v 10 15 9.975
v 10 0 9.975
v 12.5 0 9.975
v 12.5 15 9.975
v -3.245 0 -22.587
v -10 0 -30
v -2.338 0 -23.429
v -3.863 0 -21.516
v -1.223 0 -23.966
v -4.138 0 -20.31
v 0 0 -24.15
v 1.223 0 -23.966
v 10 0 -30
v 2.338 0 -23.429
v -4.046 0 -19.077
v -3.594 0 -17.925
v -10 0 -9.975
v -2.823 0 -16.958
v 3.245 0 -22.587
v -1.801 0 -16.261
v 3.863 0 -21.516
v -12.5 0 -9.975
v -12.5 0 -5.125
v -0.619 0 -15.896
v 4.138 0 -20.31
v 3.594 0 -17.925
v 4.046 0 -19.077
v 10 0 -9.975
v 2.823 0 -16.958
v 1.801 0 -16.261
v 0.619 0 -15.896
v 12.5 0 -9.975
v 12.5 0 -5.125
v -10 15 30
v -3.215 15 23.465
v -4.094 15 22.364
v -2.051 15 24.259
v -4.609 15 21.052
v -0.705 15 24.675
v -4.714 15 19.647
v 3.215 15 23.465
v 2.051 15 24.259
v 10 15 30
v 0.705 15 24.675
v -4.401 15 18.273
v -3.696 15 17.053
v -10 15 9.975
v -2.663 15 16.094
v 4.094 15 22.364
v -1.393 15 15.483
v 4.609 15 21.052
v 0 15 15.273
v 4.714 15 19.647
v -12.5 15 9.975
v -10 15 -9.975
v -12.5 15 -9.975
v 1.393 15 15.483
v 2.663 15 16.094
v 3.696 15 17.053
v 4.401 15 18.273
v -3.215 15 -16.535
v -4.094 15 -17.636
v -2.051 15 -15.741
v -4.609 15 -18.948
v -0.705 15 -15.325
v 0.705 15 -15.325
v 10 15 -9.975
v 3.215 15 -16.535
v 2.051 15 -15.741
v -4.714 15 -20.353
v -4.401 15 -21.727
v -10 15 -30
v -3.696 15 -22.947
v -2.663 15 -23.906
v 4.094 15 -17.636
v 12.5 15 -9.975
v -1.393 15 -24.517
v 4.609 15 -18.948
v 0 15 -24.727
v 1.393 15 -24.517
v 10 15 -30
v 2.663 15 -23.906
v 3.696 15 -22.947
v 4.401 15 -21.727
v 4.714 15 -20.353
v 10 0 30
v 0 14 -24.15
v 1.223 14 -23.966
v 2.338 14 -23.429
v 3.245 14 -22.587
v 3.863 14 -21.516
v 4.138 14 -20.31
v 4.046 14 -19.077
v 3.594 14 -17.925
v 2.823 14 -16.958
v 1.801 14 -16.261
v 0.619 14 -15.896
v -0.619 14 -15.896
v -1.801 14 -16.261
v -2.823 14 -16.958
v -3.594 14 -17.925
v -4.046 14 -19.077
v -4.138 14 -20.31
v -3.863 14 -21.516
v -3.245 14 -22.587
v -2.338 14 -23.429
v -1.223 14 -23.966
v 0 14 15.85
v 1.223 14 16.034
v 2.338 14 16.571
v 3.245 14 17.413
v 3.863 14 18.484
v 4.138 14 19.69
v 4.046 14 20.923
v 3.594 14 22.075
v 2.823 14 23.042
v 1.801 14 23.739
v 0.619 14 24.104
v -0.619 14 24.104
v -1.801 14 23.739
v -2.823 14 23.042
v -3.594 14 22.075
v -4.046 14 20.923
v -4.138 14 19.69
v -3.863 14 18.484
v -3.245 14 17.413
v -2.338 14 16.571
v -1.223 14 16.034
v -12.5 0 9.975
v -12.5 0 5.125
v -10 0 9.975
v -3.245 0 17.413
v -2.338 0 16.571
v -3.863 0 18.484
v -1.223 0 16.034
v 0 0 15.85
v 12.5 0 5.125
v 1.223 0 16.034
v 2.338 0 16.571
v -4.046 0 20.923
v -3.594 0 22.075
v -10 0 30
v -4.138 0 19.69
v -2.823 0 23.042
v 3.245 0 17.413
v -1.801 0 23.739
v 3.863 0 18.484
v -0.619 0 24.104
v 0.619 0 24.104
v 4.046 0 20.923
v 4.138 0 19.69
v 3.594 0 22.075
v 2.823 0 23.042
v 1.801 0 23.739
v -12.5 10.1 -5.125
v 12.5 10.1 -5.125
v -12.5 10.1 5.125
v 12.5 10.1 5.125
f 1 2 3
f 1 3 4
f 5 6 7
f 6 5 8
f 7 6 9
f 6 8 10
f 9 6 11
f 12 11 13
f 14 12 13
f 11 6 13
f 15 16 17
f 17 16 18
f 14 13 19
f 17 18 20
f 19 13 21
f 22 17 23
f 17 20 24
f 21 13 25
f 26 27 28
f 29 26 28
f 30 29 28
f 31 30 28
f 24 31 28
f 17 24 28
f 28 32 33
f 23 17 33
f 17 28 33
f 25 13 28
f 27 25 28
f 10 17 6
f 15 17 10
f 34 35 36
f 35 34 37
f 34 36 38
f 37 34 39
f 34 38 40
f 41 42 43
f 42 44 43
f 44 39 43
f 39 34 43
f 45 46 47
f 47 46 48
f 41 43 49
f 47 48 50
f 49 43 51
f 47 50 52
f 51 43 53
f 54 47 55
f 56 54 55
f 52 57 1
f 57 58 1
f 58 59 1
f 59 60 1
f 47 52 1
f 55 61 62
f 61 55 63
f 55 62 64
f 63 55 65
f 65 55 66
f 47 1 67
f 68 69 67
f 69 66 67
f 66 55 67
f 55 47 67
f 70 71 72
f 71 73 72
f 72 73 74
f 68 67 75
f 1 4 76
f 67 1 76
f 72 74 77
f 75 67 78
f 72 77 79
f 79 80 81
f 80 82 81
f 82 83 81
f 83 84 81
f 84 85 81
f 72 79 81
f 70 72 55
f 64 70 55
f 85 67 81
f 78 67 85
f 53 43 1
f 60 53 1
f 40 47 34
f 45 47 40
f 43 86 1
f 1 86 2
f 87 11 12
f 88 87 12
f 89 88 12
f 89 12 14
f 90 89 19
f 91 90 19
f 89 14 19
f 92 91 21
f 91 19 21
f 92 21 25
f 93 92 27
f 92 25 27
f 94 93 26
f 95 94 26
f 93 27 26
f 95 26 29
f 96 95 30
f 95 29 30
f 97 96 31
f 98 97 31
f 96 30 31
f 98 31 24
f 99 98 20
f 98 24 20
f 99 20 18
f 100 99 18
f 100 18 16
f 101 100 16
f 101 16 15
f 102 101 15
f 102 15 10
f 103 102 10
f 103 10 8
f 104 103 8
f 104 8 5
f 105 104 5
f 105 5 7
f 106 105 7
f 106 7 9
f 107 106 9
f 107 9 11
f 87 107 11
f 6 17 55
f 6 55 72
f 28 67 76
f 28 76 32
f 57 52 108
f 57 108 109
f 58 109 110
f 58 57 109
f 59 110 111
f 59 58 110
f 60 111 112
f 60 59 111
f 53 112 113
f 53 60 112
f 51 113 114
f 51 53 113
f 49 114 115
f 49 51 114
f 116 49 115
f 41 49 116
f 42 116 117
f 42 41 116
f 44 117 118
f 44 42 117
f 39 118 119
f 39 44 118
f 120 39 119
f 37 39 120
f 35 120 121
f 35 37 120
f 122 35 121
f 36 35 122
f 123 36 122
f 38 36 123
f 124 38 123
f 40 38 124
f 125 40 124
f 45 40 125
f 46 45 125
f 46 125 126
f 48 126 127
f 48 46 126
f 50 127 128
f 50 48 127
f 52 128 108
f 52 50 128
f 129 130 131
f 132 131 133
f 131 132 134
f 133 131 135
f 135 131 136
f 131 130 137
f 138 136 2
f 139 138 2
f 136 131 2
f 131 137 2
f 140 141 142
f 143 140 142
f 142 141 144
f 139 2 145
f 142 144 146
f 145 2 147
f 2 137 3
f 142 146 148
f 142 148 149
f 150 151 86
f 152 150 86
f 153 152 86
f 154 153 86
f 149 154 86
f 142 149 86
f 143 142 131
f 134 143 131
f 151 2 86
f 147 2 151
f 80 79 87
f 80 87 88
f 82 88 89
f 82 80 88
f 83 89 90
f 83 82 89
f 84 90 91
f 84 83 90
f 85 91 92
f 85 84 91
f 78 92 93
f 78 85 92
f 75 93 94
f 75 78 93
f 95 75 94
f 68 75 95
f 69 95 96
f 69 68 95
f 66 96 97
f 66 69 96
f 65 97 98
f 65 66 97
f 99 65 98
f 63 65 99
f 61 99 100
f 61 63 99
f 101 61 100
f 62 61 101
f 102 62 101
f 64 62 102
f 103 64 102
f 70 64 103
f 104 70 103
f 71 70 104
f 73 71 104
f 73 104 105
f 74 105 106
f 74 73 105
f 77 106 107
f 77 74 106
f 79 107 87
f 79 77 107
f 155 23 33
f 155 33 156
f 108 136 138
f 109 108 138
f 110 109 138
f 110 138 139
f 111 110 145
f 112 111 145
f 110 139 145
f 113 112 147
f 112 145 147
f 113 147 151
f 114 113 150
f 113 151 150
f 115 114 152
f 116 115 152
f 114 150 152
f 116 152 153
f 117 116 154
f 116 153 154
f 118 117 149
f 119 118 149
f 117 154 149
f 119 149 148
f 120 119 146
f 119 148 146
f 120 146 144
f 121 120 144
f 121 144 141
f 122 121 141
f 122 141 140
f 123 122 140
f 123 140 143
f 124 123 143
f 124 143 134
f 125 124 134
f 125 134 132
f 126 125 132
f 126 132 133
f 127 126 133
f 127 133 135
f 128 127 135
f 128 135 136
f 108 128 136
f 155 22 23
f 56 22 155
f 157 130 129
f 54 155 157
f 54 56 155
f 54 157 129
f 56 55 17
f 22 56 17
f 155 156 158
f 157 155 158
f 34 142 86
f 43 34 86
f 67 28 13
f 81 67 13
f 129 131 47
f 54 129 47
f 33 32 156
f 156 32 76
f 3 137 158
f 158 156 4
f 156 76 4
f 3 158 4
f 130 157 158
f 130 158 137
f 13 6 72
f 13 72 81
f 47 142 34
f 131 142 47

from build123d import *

# Parameters (mm, degrees)
SKETCH1_W                = 20
SKETCH1_H                = 60
BOSS_EXTRUDE1_DEPTH      = 15
SKETCH2_W                = 10.25
SKETCH2_H                = 10.1
CUT_EXTRUDE1_DEPTH       = 1
CUT_EXTRUDE1_DEPTH_BACK  = 21
SKETCH3_R                = 4.15
CUT_EXTRUDE2_DEPTH       = 16
BOSS_EXTRUDE2_DEPTH      = 2.5
BOSS_EXTRUDE2_DEPTH_BACK = 22.5
CHAMFER1_SIZE            = 1
CHAMFER1_SIZE2           = 0.577350269
CHAMFER1_PART_2_SIZE     = 1
CHAMFER1_PART_2_SIZE2    = 0.577350269


with BuildPart() as part:
    # Sketch1 → Boss-Extrude1 (new body)
    with BuildSketch(Plane(origin=(0, 0, 0), x_dir=(1, 0, 0), z_dir=(0, 1, 0))):
        Rectangle(SKETCH1_W, SKETCH1_H)
    extrude(amount=BOSS_EXTRUDE1_DEPTH)

    # Sketch2 → Cut-Extrude1 (cut, two sides)
    with BuildSketch(Plane(origin=(10, 0, 0), x_dir=(0, 0, -1), z_dir=(1, 0, 0))) as cut_extrude1_sk:
        with Locations((0, 5.05)):
            Rectangle(SKETCH2_W, SKETCH2_H)
    extrude(amount=CUT_EXTRUDE1_DEPTH, mode=Mode.SUBTRACT)
    extrude(cut_extrude1_sk.sketch, amount=-CUT_EXTRUDE1_DEPTH_BACK, mode=Mode.SUBTRACT)

    # Sketch3 → Cut-Extrude2 (cut, through all)
    with BuildSketch(Plane.XZ):
        with Locations(Location((0, 20, 0), (0, 0, 270))):  # turned: the seam where the file's is
            Circle(SKETCH3_R)
        with Locations(Location((0, -20, 0), (0, 0, 270))):  # turned: the seam where the file's is
            Circle(SKETCH3_R)
    extrude(amount=-CUT_EXTRUDE2_DEPTH, mode=Mode.SUBTRACT)

    # Sketch4 → Boss-Extrude2 (add, two sides)
    with BuildSketch(Plane(origin=(10, 0, 0), x_dir=(0, 0, -1), z_dir=(1, 0, 0))) as boss_extrude2_sk:
        Polygon((-5.125, 0), (-9.975, 0), (-9.975, 15), (9.975, 15), (9.975, 0), (5.125, 0), (5.125, 10.1), (-5.125, 10.1), align=None)
    extrude(amount=BOSS_EXTRUDE2_DEPTH)
    extrude(boss_extrude2_sk.sketch, amount=-BOSS_EXTRUDE2_DEPTH_BACK)

    # Chamfer1
    chamfer1_edges = [part.edges().sort_by_distance(p)[0] for p in [
        (0, 15, 24.15),
    ]]
    chamfer1_side = [part.faces().sort_by_distance(p)[0] for p in [
        (0, 7.5, 24.15),
    ]]
    chamfer(chamfer1_edges, length=CHAMFER1_SIZE, length2=CHAMFER1_SIZE2, reference=chamfer1_side[0])

    # Chamfer1 part 2
    chamfer1_part_2_edges = [part.edges().sort_by_distance(p)[0] for p in [
        (0, 15, -15.85),
    ]]
    chamfer1_part_2_side = [part.faces().sort_by_distance(p)[0] for p in [
        (0, 7.5, -15.85),
    ]]
    chamfer(chamfer1_part_2_edges, length=CHAMFER1_PART_2_SIZE, length2=CHAMFER1_PART_2_SIZE2, reference=chamfer1_part_2_side[0])


solid = part.part
